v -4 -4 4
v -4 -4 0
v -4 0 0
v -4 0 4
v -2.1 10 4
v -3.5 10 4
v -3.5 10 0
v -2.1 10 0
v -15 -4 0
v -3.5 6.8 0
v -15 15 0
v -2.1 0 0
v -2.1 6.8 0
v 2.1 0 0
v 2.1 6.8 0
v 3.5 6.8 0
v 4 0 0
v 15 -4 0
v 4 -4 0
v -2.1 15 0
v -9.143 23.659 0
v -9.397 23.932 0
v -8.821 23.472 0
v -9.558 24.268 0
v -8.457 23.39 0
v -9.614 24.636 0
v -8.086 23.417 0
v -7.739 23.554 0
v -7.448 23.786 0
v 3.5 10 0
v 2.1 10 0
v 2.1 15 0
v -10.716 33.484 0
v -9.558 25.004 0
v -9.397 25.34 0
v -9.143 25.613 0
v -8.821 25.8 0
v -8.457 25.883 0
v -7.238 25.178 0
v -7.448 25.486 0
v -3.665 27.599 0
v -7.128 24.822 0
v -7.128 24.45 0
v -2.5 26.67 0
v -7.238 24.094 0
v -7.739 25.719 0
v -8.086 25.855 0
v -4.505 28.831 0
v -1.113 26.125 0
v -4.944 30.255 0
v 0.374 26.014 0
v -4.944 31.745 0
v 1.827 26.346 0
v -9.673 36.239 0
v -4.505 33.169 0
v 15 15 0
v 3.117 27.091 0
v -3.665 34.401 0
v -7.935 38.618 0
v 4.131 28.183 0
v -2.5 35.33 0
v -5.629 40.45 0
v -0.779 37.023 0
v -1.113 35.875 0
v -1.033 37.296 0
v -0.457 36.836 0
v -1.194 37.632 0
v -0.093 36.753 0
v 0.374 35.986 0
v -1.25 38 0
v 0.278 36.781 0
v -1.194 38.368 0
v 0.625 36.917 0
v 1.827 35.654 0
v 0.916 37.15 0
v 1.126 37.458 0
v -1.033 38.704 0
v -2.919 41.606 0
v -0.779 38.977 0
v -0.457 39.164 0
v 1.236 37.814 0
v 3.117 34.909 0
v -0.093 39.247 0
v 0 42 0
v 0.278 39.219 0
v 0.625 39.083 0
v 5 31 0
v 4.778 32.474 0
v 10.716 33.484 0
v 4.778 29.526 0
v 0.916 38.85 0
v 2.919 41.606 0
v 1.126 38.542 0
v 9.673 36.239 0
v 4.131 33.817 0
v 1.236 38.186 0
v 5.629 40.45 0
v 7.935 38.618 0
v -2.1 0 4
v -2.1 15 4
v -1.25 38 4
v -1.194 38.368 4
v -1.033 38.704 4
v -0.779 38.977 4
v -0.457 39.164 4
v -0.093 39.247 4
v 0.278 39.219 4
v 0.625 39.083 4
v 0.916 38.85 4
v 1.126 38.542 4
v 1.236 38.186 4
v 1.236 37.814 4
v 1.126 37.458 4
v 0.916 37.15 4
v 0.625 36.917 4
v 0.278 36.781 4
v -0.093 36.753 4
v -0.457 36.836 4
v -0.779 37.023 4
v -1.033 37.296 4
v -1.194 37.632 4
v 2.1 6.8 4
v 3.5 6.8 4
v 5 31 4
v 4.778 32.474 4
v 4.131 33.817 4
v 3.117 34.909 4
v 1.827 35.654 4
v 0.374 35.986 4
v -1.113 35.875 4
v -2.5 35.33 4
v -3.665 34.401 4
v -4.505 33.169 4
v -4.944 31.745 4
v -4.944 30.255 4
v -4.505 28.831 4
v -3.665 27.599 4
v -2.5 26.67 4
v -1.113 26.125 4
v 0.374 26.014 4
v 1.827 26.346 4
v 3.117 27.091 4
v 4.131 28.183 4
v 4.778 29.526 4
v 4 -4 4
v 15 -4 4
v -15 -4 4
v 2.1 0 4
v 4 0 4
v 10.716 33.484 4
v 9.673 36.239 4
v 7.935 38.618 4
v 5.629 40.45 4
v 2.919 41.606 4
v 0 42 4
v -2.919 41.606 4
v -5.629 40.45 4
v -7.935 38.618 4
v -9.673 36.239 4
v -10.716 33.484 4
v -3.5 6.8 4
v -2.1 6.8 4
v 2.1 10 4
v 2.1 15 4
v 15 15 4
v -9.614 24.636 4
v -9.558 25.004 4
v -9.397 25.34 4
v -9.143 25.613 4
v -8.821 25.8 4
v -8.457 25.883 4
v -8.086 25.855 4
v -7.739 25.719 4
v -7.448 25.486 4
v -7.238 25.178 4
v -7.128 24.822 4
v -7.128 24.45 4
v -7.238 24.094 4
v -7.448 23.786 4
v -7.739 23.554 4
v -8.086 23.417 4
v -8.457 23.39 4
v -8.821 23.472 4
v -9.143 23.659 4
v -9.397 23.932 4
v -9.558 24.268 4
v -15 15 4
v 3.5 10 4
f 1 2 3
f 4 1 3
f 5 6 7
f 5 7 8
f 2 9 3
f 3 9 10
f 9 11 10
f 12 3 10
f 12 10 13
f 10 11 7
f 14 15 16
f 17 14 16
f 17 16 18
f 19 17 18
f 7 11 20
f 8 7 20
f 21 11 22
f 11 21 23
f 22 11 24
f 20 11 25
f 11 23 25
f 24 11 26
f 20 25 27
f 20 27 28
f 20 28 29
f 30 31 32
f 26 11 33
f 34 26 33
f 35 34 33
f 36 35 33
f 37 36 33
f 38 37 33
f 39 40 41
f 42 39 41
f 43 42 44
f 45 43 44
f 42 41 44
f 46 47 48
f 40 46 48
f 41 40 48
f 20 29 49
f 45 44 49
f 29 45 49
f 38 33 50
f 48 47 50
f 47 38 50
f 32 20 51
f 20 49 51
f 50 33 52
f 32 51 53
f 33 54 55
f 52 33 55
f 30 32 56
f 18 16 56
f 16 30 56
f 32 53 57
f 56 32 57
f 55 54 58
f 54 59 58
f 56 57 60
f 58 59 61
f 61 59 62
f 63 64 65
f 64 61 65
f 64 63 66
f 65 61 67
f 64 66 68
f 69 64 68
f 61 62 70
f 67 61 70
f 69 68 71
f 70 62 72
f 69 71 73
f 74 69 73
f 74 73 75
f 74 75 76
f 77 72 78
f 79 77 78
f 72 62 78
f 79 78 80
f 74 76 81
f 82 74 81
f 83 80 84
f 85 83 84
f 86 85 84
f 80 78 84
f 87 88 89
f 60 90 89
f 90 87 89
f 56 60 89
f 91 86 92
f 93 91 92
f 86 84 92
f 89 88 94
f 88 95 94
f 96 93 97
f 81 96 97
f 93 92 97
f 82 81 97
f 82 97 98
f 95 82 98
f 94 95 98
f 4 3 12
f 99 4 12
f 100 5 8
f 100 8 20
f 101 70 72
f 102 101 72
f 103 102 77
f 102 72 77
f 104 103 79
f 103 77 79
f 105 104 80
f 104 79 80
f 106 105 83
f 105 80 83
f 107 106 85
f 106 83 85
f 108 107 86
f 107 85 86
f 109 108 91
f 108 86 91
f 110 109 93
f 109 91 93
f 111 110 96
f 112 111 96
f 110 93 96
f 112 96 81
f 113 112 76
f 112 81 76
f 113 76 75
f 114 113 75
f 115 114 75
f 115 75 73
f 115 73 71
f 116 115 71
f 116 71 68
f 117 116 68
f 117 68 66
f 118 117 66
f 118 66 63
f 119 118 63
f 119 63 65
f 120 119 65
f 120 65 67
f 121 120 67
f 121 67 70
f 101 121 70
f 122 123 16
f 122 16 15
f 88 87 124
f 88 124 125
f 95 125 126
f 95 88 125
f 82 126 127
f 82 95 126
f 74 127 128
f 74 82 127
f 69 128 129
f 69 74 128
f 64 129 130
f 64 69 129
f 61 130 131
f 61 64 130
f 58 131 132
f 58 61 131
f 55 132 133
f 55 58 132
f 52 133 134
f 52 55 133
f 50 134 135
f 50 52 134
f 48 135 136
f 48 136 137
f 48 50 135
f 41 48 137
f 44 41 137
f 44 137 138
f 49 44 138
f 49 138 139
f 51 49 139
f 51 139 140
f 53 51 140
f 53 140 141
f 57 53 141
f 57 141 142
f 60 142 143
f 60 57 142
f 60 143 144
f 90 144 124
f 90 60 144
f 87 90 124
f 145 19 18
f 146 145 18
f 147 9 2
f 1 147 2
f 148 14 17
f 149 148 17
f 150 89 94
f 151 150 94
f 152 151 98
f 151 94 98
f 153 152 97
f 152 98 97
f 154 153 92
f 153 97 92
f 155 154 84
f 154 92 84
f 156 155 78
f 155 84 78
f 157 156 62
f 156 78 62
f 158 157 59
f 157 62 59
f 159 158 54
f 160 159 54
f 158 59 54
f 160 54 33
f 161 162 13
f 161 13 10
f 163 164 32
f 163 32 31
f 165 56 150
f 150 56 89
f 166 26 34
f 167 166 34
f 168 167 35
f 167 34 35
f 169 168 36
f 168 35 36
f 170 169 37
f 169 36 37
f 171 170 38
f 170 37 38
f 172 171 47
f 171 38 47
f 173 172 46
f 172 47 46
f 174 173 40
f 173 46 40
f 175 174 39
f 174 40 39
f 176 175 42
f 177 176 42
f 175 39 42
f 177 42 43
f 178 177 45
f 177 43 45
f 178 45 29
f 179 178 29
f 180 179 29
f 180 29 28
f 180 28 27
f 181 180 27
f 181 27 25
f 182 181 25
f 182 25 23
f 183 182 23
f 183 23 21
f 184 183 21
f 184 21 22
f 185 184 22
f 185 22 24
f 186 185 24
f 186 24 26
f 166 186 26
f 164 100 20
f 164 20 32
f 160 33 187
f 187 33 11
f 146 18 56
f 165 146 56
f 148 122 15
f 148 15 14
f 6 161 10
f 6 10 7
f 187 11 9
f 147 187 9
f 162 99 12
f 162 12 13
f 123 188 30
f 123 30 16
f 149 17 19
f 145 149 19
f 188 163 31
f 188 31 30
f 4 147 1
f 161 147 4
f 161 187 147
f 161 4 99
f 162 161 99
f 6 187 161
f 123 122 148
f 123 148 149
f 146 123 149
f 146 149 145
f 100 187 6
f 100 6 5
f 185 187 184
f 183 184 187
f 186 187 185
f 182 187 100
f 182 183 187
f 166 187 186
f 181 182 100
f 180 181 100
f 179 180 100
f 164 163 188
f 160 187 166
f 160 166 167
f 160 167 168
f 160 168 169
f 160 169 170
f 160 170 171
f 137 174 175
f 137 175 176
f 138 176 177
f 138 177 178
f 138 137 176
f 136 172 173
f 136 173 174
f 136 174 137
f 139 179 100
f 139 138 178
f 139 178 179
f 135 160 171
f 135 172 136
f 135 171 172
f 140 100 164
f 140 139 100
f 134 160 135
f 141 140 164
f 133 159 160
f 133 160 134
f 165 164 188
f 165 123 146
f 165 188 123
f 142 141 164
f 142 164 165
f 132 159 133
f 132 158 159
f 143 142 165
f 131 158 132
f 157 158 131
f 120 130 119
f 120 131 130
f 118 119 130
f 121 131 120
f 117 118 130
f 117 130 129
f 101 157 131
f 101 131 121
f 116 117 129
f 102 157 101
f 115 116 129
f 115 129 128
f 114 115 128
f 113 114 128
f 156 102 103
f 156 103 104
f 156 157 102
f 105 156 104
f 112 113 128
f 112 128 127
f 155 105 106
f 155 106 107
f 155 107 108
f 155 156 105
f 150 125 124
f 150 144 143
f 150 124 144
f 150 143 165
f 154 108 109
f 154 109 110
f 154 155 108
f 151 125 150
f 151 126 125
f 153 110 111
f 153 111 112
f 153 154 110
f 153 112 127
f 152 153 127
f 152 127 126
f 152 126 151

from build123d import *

# Parameters (mm, degrees)
SKETCH6_R           = 5
BOSS_EXTRUDE5_DEPTH = 4
SKETCH10_R          = 1.25
CUT_EXTRUDE6_DEPTH  = 45.777226354
CUT_EXTRUDE7_DEPTH  = 45.777226354


with BuildPart() as part:
    # Sketch6 → Boss-Extrude5 (new body)
    with BuildSketch(Plane.XY):
        with BuildLine():
            Line((15, 0), (15, 15))
            Line((15, 15), (10.715935986, 33.483689987))
            ThreePointArc((10.715935986, 33.483689987), (0, 42), (-10.715935986, 33.483689987))
            Line((-10.715935986, 33.483689987), (-15, 15))
            Line((-15, 15), (-15, 0))
            Line((-15, 0), (-15, -4))
            Line((-15, -4), (-4, -4))
            Line((-4, -4), (-4, 0))
            Line((-4, 0), (4, 0))
            Line((4, 0), (4, -4))
            Line((4, -4), (15, -4))
            Line((15, -4), (15, 0))
        make_face()
        with Locations((0, 31)):
            Circle(SKETCH6_R, mode=Mode.SUBTRACT)
    extrude(amount=BOSS_EXTRUDE5_DEPTH)

    # Sketch10 → Cut-Extrude6 (cut, through all)
    with BuildSketch(Plane(origin=(0, 0, 0), x_dir=(-1, 0, 0), z_dir=(0, 0, -1))):
        with Locations((0, 38)):
            Circle(SKETCH10_R)
        with Locations((4.949747468, 44.949747468)):
            Circle(SKETCH10_R)
        with Locations((13.363961031, 46.363961031)):
            Circle(SKETCH10_R)
        with Locations((20.313708499, 41.414213562)):
            Circle(SKETCH10_R)
        with Locations((21.727922061, 33)):
            Circle(SKETCH10_R)
        with Locations((16.778174593, 26.050252532)):
            Circle(SKETCH10_R)
        with Locations((8.363961031, 24.636038969)):
            Circle(SKETCH10_R)
        with Locations((1.414213562, 29.585786438)):
            Circle(SKETCH10_R)
    extrude(amount=-CUT_EXTRUDE6_DEPTH, mode=Mode.SUBTRACT)

    # Sketch11 → Cut-Extrude7 (cut, through all)
    with BuildSketch(Plane.XY.offset(4)):
        Polygon((-2.1, 10), (-2.1, 15), (2.1, 15), (2.1, 10), (3.5, 10), (3.5, 6.8), (2.1, 6.8), (2.1, 0), (-2.1, 0), (-2.1, 6.8), (-3.5, 6.8), (-3.5, 10), align=None)
    extrude(amount=-CUT_EXTRUDE7_DEPTH, mode=Mode.SUBTRACT)


solid = part.part
